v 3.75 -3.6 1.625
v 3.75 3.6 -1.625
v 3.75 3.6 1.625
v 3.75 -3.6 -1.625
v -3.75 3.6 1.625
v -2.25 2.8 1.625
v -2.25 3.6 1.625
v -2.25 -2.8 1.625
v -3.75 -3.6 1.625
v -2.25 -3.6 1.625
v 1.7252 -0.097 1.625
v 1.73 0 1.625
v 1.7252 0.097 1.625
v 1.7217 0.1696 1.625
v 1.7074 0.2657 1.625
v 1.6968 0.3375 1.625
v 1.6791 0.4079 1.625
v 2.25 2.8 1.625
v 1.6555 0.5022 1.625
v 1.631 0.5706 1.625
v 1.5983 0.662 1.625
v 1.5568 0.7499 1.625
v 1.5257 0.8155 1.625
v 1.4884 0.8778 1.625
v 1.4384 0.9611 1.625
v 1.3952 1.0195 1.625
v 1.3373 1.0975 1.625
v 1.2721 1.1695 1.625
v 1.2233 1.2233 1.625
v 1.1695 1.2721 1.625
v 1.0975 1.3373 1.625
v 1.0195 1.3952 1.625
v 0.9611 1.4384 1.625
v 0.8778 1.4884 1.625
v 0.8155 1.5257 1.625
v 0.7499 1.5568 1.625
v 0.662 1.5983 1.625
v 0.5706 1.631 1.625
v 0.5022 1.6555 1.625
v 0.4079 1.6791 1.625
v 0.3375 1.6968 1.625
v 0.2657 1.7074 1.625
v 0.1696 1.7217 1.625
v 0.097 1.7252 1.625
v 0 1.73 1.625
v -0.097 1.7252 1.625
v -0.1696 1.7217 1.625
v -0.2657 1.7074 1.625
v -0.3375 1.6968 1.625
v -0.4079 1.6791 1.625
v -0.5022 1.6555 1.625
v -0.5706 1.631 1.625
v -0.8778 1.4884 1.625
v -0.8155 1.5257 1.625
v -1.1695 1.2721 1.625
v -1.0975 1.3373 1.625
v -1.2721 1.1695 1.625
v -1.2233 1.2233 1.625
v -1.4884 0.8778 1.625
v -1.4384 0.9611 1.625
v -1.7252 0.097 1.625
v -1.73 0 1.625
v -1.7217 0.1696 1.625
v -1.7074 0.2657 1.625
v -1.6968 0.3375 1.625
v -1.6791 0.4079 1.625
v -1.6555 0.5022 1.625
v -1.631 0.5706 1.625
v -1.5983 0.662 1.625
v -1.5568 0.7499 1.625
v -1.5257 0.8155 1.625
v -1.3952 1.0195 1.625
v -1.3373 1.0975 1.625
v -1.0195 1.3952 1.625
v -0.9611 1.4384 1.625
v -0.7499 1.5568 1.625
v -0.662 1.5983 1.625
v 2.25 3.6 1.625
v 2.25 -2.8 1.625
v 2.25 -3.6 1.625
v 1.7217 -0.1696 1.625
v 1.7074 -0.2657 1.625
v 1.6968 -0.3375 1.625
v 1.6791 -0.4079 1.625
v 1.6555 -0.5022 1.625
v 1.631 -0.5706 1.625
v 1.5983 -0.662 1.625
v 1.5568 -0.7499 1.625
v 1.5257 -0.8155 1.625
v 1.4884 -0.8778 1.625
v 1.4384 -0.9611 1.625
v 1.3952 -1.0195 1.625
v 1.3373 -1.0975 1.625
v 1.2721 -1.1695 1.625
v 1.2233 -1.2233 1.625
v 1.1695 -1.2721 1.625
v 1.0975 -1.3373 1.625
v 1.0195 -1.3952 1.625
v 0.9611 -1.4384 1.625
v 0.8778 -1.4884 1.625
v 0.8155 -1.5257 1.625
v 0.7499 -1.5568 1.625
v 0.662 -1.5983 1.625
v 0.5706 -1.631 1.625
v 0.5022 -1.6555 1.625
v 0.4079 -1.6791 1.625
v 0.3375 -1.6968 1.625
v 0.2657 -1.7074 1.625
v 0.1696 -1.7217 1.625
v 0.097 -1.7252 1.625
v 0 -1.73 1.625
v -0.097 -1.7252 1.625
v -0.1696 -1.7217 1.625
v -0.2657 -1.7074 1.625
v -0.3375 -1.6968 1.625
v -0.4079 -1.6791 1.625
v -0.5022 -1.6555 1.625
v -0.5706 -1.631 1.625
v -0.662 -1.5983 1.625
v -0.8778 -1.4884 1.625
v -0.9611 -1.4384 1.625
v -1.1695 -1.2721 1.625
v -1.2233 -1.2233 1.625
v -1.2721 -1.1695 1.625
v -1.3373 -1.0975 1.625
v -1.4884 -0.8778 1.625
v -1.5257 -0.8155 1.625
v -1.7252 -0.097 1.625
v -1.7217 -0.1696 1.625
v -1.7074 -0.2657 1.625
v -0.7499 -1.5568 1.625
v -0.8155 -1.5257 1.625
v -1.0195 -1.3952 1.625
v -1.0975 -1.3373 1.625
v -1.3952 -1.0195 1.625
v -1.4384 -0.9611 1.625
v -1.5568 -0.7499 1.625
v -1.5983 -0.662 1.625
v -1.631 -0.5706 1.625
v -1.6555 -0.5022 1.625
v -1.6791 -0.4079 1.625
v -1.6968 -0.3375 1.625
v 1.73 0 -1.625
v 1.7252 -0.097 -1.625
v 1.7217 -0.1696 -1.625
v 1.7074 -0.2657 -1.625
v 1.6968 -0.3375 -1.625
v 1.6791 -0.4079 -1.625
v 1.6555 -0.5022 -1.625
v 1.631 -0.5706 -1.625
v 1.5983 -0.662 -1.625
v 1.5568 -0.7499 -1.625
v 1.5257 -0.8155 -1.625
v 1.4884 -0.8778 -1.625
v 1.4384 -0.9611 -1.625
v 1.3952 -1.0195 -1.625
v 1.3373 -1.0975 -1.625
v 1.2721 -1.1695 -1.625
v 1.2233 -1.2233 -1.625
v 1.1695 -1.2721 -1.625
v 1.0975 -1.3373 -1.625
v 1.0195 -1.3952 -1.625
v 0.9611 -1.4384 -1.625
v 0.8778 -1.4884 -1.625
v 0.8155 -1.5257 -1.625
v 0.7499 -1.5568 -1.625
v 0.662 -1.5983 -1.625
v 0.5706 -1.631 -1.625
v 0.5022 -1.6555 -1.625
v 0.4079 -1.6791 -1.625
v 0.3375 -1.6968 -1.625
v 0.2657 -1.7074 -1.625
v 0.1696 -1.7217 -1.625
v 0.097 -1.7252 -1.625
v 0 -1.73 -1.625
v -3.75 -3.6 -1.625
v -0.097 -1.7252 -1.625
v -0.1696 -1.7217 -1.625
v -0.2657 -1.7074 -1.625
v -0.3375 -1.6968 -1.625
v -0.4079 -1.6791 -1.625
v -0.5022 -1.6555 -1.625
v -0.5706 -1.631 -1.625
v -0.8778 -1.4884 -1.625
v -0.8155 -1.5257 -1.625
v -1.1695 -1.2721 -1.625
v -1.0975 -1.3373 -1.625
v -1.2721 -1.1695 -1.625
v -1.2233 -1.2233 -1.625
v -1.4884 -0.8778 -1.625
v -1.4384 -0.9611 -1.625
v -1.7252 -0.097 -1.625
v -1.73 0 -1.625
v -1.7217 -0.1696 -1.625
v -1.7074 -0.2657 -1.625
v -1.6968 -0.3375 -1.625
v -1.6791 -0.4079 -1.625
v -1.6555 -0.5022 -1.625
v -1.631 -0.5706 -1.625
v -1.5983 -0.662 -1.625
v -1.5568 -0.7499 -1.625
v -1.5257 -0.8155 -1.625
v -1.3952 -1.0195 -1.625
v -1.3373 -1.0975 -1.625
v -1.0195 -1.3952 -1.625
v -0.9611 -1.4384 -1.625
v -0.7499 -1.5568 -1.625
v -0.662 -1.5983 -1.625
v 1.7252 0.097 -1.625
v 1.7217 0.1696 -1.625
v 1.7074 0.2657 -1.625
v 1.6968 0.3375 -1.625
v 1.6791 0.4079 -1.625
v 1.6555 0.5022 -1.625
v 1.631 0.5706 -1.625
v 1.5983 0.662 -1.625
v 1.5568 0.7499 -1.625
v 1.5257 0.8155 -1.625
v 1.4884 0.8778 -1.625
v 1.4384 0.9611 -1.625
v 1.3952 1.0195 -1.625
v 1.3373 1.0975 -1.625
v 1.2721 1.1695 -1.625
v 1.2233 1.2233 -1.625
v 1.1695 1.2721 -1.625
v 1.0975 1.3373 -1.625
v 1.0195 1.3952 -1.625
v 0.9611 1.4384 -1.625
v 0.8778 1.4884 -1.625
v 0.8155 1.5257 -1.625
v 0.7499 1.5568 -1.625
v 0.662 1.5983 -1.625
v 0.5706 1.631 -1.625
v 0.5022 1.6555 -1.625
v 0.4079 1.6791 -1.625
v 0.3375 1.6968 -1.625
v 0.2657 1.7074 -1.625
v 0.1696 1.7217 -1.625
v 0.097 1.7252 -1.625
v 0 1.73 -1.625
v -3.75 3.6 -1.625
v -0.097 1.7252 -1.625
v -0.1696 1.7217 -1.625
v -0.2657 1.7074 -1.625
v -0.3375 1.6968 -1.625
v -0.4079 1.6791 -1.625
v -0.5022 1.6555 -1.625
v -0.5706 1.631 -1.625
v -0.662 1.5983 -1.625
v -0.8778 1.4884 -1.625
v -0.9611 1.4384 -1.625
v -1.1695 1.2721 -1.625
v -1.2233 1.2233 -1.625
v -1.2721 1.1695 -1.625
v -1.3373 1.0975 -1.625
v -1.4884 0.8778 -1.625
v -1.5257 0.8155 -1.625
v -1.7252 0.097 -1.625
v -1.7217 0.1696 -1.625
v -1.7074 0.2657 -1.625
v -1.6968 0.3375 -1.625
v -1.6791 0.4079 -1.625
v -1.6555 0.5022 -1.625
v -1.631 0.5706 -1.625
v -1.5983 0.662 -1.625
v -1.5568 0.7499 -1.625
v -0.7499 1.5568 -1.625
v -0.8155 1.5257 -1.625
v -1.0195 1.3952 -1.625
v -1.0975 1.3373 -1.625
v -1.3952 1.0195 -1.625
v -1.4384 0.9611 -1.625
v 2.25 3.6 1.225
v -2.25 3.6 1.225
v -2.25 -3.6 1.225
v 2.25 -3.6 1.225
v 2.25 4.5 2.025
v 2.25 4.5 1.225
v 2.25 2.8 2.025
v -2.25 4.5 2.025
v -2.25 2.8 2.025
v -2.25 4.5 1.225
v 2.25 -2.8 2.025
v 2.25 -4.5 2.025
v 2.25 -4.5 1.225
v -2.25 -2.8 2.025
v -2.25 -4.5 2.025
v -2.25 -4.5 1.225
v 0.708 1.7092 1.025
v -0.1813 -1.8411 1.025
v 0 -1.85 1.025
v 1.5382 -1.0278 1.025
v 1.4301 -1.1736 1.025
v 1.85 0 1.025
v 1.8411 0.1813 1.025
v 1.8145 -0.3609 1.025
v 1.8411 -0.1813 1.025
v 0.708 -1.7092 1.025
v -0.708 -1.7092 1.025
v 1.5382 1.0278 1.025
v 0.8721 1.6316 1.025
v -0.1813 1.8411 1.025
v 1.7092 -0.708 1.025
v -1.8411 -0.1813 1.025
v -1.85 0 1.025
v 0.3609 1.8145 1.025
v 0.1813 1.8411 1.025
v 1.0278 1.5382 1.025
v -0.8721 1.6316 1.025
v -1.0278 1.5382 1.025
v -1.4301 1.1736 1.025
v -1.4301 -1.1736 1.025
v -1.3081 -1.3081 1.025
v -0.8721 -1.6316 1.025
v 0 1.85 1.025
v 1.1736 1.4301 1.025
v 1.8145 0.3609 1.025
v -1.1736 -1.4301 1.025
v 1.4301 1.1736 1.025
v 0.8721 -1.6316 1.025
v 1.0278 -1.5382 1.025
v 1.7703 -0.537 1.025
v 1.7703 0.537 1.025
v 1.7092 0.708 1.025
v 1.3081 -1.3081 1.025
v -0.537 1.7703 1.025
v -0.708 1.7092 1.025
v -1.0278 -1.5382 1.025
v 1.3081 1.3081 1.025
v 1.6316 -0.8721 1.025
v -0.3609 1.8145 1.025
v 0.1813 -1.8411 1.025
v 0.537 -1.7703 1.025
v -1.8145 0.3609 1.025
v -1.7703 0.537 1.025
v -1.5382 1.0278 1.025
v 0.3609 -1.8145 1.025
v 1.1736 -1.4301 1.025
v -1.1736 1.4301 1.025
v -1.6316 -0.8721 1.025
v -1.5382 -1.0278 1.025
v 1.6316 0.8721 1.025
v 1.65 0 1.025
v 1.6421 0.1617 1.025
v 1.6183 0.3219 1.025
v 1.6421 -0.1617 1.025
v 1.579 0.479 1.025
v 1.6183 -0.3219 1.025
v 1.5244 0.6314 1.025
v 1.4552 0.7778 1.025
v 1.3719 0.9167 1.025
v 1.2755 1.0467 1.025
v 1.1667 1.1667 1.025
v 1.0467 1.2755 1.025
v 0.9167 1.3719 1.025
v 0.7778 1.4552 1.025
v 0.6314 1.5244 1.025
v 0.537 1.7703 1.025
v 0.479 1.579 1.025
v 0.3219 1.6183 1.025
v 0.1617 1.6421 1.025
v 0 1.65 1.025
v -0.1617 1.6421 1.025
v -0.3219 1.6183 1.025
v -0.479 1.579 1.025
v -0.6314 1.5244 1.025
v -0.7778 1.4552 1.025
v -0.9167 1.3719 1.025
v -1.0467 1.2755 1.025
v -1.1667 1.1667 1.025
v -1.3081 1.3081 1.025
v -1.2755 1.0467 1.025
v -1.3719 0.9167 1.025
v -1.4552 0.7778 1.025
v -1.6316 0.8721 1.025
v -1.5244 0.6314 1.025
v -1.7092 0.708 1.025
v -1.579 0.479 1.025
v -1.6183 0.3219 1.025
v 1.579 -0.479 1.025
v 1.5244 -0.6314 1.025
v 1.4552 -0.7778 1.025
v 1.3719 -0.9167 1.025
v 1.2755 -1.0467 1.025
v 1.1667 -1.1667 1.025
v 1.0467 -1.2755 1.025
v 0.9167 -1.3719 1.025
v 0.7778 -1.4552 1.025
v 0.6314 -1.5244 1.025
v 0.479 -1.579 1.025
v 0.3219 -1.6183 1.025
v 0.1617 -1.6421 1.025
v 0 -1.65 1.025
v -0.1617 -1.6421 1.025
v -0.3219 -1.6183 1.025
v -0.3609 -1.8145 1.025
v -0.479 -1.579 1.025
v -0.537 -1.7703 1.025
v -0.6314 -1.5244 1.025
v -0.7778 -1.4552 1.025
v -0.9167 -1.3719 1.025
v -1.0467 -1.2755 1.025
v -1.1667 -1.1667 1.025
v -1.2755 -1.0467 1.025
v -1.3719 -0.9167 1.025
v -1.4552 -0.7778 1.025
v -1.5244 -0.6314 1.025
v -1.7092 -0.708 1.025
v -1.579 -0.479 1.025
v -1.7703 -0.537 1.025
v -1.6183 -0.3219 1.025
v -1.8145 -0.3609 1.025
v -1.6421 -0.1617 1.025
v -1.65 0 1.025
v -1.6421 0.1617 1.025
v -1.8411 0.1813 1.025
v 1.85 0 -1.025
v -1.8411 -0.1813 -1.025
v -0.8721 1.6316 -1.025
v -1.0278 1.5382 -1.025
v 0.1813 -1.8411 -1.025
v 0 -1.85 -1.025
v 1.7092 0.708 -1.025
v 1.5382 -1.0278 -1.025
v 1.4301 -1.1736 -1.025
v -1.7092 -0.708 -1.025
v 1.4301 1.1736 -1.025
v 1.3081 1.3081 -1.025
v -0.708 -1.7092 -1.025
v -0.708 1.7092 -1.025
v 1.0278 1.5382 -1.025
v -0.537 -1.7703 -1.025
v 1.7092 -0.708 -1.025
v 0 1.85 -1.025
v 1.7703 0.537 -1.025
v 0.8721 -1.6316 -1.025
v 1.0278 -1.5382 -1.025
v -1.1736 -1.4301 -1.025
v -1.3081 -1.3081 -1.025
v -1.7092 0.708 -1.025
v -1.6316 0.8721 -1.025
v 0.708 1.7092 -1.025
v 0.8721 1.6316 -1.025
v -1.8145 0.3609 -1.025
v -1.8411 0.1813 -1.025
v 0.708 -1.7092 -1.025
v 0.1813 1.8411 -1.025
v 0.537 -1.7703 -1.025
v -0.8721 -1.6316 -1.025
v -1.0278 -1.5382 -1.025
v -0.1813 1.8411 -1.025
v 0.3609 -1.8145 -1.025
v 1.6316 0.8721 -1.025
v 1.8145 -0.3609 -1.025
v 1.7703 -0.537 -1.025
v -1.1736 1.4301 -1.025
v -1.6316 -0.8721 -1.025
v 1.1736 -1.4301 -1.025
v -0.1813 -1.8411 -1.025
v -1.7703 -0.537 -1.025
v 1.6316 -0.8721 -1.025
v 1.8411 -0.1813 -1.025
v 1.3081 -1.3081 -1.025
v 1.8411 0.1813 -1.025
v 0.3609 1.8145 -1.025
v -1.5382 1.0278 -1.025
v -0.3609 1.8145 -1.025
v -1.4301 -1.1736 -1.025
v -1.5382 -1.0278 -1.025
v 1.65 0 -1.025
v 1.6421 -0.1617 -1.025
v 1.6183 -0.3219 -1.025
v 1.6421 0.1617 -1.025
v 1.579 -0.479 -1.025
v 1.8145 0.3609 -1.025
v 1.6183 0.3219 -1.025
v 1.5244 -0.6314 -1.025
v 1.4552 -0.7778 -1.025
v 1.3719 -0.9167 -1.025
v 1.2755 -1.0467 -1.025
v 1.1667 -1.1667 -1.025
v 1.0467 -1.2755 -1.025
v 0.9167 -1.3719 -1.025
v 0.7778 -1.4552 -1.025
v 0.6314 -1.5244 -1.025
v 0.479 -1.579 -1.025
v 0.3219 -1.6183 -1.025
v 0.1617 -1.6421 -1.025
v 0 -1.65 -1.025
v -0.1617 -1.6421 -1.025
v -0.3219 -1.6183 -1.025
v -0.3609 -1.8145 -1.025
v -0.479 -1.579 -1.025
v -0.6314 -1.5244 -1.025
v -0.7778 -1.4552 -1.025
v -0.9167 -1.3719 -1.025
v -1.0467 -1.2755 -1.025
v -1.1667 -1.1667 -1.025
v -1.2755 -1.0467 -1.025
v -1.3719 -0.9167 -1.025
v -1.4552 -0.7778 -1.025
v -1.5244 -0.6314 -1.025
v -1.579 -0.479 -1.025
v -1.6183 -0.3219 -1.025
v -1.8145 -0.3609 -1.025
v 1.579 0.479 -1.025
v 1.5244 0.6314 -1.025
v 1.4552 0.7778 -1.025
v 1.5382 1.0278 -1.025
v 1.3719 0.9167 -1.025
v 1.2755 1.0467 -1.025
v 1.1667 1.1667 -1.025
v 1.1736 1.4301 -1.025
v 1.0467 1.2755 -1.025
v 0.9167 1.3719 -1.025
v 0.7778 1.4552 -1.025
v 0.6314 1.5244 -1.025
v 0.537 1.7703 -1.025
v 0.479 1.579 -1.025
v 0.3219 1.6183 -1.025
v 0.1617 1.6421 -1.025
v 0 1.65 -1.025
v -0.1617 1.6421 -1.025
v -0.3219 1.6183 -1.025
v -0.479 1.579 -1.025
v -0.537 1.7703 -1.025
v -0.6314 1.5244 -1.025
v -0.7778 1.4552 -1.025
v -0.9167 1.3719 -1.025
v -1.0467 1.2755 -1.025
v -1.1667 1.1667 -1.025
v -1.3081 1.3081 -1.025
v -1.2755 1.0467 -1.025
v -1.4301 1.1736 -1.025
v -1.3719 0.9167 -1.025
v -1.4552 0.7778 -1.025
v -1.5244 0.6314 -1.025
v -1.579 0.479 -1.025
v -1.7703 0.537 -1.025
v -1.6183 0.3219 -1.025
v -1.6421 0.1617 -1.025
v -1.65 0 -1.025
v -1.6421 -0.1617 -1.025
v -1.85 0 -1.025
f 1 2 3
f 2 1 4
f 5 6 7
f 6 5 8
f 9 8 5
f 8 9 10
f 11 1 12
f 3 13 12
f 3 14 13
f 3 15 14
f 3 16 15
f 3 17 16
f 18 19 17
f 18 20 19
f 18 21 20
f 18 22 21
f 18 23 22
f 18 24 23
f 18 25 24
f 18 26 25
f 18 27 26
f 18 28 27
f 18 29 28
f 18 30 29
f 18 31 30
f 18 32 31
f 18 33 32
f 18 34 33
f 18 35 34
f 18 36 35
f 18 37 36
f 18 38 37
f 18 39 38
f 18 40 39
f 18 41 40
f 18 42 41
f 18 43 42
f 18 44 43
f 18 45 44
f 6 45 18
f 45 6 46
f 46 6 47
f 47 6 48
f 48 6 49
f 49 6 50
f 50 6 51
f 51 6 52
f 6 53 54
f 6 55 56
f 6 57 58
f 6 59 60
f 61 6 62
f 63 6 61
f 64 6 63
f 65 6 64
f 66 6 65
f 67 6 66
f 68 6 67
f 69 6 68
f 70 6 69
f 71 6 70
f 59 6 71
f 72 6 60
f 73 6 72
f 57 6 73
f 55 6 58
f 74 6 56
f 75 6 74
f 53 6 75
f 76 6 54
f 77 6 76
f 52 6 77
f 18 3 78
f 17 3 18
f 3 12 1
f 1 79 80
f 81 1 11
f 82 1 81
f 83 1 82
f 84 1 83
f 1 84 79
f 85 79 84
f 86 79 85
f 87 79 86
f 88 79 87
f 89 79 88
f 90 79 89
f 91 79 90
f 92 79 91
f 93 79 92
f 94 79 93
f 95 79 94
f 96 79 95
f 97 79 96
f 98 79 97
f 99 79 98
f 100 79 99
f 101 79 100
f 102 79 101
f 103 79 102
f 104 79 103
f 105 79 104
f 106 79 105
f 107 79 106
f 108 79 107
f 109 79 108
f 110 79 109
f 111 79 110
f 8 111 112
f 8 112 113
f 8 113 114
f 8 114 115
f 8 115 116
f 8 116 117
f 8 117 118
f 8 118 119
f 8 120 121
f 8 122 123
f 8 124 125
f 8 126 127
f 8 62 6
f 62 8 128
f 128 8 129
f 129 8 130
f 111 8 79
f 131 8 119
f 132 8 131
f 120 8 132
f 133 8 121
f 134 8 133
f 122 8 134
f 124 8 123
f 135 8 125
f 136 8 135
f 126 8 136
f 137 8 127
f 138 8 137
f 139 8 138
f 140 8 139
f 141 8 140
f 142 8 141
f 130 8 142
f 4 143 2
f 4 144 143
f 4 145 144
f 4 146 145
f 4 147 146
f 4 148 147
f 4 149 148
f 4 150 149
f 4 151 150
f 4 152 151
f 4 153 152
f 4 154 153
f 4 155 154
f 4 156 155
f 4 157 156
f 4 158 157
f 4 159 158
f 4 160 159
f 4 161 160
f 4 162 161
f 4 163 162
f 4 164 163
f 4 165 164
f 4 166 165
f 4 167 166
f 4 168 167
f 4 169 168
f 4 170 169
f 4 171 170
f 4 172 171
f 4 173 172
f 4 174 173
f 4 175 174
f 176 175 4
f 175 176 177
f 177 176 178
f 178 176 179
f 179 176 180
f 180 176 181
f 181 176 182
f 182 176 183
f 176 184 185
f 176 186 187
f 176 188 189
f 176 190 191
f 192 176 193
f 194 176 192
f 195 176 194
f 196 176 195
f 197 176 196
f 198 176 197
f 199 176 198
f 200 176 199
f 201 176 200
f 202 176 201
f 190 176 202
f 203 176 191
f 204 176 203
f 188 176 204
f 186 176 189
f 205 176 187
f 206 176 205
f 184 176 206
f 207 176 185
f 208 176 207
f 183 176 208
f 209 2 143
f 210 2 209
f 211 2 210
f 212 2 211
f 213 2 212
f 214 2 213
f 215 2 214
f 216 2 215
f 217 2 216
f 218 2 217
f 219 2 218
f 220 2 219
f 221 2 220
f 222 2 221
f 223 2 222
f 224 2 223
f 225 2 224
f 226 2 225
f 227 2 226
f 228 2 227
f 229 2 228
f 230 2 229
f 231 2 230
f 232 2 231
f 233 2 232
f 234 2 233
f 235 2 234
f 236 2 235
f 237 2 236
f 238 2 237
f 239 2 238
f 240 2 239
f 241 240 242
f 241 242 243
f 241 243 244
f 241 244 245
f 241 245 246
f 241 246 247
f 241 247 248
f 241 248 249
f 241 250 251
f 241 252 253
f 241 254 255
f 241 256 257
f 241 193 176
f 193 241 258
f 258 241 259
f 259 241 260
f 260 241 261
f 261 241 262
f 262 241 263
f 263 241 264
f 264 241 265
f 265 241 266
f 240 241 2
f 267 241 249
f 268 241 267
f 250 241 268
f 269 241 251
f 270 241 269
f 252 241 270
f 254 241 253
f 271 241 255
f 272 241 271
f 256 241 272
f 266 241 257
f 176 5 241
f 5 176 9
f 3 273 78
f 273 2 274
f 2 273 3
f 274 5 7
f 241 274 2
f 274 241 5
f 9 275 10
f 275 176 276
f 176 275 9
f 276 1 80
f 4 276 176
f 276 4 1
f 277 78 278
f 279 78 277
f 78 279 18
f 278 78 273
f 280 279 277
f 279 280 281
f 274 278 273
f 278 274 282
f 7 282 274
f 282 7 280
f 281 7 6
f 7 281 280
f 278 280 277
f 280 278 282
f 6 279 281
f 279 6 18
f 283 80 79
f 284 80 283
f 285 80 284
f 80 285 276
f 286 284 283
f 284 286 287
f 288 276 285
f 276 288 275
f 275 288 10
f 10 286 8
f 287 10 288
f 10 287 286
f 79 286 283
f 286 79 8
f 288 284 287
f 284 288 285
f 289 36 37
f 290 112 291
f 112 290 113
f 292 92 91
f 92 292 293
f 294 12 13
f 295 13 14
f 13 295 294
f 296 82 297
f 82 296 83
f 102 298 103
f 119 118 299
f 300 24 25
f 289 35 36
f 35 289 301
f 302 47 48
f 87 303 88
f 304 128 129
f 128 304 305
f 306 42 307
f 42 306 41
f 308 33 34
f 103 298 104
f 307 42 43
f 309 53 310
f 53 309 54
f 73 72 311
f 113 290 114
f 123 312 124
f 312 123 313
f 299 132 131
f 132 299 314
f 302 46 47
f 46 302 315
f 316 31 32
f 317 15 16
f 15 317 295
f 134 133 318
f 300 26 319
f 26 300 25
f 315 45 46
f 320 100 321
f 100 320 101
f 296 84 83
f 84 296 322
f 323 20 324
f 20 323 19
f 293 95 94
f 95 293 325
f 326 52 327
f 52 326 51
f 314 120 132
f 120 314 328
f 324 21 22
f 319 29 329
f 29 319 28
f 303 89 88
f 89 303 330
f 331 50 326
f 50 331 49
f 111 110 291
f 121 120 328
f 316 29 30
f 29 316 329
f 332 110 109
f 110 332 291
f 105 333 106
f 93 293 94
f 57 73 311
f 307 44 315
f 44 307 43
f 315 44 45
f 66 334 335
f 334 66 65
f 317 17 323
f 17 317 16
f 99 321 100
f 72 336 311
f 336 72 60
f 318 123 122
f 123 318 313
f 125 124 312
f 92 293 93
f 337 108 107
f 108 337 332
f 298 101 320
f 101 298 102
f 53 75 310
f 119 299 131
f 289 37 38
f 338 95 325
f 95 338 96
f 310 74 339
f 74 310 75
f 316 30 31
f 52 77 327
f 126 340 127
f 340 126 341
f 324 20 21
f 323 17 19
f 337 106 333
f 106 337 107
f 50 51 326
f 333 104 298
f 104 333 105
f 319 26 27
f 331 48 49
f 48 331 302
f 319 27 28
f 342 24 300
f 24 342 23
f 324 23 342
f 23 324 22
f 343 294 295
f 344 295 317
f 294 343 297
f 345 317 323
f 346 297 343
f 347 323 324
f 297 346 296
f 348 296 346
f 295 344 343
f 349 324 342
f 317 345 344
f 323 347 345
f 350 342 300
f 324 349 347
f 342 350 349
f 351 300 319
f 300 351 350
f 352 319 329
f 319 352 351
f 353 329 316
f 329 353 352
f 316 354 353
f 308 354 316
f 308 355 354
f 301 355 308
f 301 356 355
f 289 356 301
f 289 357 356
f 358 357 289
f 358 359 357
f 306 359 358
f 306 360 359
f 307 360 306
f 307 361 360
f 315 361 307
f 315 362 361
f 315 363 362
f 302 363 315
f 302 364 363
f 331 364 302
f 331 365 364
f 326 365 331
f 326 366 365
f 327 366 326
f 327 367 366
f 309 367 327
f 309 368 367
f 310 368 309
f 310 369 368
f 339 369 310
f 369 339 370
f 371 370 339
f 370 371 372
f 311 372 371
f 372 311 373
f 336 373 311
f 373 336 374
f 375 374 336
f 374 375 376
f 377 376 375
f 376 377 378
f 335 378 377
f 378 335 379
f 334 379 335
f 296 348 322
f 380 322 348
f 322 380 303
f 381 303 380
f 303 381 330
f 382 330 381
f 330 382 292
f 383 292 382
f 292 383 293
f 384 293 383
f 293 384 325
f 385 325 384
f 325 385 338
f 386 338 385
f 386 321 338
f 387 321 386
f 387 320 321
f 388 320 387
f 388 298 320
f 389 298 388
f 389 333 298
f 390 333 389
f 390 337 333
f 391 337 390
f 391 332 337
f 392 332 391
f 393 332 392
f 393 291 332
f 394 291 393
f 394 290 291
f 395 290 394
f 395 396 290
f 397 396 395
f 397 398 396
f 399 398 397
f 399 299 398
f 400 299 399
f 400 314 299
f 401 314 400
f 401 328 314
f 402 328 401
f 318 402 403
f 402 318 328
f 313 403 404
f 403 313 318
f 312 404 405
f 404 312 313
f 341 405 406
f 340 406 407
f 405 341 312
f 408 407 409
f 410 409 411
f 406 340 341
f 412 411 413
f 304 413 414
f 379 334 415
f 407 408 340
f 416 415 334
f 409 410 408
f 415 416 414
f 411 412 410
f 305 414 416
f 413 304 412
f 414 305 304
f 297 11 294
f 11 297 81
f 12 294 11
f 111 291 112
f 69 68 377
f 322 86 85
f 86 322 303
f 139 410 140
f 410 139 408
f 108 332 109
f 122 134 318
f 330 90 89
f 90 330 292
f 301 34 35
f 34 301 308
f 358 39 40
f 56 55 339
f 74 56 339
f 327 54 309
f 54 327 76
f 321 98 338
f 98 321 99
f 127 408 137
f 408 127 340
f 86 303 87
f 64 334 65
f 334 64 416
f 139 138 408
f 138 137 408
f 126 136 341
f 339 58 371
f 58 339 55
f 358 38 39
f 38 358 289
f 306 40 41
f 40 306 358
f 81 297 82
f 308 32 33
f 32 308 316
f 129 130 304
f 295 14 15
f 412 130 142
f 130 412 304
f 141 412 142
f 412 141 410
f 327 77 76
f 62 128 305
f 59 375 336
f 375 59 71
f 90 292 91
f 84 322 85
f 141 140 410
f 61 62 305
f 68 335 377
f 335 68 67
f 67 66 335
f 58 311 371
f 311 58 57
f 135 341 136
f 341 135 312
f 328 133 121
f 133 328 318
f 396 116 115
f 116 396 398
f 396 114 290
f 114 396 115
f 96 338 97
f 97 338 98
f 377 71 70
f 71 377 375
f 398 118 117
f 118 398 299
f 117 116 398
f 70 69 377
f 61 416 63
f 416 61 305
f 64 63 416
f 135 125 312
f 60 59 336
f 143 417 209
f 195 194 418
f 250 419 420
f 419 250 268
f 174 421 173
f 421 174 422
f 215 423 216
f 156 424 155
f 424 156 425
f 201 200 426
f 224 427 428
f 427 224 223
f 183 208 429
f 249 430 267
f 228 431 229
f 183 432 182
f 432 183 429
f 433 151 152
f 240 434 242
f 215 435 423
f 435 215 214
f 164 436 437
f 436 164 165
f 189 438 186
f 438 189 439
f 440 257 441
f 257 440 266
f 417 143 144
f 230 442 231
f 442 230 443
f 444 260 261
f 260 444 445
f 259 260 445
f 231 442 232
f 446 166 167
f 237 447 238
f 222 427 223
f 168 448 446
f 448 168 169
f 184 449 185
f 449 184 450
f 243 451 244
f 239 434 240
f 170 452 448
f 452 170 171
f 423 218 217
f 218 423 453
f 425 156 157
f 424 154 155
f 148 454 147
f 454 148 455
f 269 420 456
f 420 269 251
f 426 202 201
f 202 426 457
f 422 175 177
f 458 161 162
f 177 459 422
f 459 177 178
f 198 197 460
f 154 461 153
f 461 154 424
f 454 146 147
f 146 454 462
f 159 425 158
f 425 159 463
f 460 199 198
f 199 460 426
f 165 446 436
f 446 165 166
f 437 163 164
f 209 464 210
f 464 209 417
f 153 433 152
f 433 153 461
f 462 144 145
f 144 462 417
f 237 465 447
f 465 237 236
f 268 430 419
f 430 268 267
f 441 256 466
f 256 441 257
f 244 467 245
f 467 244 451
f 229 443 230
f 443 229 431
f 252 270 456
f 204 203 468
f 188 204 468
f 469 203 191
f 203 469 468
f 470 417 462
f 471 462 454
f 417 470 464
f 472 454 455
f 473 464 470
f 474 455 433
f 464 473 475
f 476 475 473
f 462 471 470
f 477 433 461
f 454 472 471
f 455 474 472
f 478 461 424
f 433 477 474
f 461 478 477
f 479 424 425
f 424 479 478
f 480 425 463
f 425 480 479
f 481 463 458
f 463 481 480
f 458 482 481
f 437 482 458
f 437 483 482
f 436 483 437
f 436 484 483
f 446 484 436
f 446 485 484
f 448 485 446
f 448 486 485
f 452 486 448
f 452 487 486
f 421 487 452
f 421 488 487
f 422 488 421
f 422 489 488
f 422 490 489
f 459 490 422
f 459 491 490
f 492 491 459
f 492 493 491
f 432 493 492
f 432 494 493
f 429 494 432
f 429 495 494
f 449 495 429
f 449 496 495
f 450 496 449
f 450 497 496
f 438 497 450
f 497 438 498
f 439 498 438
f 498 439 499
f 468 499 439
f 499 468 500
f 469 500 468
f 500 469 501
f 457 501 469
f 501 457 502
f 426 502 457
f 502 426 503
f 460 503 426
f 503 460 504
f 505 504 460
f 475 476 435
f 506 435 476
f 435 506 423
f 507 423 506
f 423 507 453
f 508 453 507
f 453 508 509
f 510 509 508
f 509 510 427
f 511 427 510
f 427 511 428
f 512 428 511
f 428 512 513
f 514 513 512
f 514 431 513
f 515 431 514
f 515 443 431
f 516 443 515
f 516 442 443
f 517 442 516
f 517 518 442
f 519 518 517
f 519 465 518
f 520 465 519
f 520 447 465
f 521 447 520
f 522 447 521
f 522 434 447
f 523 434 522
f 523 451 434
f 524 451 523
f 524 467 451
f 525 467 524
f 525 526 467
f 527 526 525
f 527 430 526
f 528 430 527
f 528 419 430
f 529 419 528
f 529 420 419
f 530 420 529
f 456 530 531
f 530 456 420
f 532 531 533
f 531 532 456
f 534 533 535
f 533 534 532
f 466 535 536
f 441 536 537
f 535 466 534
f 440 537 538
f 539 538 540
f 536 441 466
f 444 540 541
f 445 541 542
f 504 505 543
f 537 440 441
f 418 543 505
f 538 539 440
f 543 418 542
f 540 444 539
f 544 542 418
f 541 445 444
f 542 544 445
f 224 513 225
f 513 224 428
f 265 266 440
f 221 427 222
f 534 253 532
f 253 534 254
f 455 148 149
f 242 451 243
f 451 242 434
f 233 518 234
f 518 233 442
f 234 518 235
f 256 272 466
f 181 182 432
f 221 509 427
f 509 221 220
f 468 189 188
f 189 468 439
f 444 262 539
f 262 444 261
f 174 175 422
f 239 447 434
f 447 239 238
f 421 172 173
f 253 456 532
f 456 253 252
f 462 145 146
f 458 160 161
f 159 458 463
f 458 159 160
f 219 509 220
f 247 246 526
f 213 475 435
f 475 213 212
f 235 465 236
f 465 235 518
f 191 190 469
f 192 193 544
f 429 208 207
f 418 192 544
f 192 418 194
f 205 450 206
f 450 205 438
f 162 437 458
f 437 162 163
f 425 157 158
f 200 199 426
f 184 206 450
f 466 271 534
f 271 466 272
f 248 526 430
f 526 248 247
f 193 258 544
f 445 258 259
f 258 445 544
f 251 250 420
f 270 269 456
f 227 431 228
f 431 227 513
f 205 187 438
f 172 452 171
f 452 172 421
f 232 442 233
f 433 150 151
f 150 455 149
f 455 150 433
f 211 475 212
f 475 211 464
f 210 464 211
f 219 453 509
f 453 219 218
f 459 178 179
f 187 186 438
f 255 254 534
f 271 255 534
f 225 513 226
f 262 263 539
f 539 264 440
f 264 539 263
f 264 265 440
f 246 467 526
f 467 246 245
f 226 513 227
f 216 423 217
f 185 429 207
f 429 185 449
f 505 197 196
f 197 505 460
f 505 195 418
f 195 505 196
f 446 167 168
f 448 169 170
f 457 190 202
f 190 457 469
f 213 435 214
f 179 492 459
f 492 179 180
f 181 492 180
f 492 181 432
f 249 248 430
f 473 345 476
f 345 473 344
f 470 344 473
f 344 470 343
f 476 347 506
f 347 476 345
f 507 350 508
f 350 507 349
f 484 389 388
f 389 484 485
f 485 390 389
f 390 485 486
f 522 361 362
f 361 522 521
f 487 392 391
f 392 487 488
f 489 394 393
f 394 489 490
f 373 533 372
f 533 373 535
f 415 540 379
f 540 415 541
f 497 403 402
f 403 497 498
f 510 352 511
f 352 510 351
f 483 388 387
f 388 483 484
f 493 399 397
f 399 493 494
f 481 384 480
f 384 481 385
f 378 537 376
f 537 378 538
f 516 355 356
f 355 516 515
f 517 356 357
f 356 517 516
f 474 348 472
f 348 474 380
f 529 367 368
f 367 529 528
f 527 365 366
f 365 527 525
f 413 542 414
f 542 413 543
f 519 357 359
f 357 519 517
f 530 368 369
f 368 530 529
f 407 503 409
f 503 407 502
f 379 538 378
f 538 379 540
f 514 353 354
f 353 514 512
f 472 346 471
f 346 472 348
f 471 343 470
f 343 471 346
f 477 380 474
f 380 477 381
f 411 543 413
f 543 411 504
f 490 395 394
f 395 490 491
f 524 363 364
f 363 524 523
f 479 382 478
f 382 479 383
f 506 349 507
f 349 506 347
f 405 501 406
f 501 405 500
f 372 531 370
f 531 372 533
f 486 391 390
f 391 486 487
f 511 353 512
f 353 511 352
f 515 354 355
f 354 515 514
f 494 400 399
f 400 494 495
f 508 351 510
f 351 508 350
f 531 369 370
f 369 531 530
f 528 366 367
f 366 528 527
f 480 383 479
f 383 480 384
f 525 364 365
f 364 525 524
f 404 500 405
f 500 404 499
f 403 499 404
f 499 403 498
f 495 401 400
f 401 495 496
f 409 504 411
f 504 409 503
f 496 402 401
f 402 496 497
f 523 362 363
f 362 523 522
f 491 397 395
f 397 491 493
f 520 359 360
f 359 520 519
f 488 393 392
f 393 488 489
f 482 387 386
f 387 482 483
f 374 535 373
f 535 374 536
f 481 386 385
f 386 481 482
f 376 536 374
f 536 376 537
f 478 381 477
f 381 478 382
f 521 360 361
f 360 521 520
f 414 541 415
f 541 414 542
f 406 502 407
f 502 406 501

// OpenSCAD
// Parameters
screw_nominal_diameter_mm = 4.0; //[2.0:8.0:0.1]
nut_across_flats_mm = 6.0; //[3.0:12.0:0.1]
nut_thickness_mm = 3.25; //[1.6:6.5:0.05]
hole_type_threaded = 1; //[0:1:1]
thread_pitch_mm = 0.7; //[0.35:1.4:0.05]  // (not modeled; drill/tap only)
clearance_hole_diameter_mm_if_unthreaded = 4.3; //[4.0:5.0:0.05]
tap_drill_diameter_mm_for_threaded = 3.3; //[2.5:4.0:0.05]
edge_chamfer_mm = 0.2; //[0.0:0.8:0.05]
fit_clearance_mm = 0.2; //[0.0:0.6:0.05]
t_slot_width_mm = 8.0; //[4.0:16.0:0.1]
t_slot_lip_thickness_mm = 1.5; //[0.8:3.0:0.1]
t_slot_depth_mm = 6.0; //[3.0:12.0:0.1]
shoulder_height_mm = 0.8; //[0.4:1.6:0.05]
shoulder_overhang_mm = 0.8; //[0.3:2.0:0.05]
shoulder_length_mm = 4.5; //[2.0:10.0:0.1]
overlap_mm = 0.8; //[0.5:2.0:0.1]

// Quality
$fn = 64;

// Helpers
function hex_R_from_AF(af) = af/(2*cos(30)); // circumradius for a hex with across-flats = af

module hex_prism(af, h, center=true) {
    cylinder(r=hex_R_from_AF(af), h=h, center=center, $fn=6);
}

module chamfered_hex(af, h, chamfer) {
    // Chamfered by subtracting two 45° cones from top/bottom edges
    difference() {
        hex_prism(af, h, center=true);

        if (chamfer > 0) {
            // Top chamfer
            translate([0,0, h/2 - chamfer/2])
                cylinder(h=chamfer + overlap_mm,
                         r1=hex_R_from_AF(af) + chamfer,
                         r2=hex_R_from_AF(af) - 0.01,
                         center=true, $fn=6);

            // Bottom chamfer
            translate([0,0,-h/2 + chamfer/2])
                cylinder(h=chamfer + overlap_mm,
                         r1=hex_R_from_AF(af) - 0.01,
                         r2=hex_R_from_AF(af) + chamfer,
                         center=true, $fn=6);
        }
    }
}

// M4 T-slot / hammer nut (single connected solid with a through-hole)
module M4_hammer_nut() {
    // Body dimensions (typical hammer nut: rectangular bar with two retention shoulders)
    body_len_mm = max(shoulder_length_mm + 2.0, t_slot_width_mm - 0.5); // along X
    body_w_mm   = max(nut_across_flats_mm + 1.0, t_slot_width_mm - 0.8); // along Y
    body_h_mm   = nut_thickness_mm;

    // Shoulders: small ledges near the top that catch under the T-slot lips
    shoulder_w_mm = max(0.6, t_slot_lip_thickness_mm + fit_clearance_mm); // along Y (each side)
    shoulder_len_mm = min(body_len_mm, shoulder_length_mm);
    shoulder_h_mm = min(shoulder_height_mm, body_h_mm * 0.6);

    // Place shoulders at the top face, protruding outward in +/-Y
    shoulder_z = body_h_mm/2 - shoulder_h_mm/2 + overlap_mm/2;
    shoulder_y = body_w_mm/2 + shoulder_w_mm/2 - overlap_mm; // overlap into body for connectivity

    // Hole diameter (modeled as drill/tap hole or clearance hole)
    hole_d = (hole_type_threaded == 1) ? tap_drill_diameter_mm_for_threaded
                                       : clearance_hole_diameter_mm_if_unthreaded;

    difference() {
        union() {
            // Main rectangular hammer-nut body
            translate([0,0,0])
                cube([body_len_mm, body_w_mm, body_h_mm], center=true);

            // Retention shoulders (connected via calculated overlap)
            translate([0,  shoulder_y, shoulder_z])
                cube([shoulder_len_mm, shoulder_w_mm, shoulder_h_mm], center=true);

            translate([0, -shoulder_y, shoulder_z])
                cube([shoulder_len_mm, shoulder_w_mm, shoulder_h_mm], center=true);

            // Optional small top chamfered hex boss to show 6mm across-flats feature
            // (kept low so overall thickness remains nut_thickness_mm)
            boss_h = min(1.2, body_h_mm - 0.4);
            boss_z = body_h_mm/2 - boss_h/2 - 0.0; // sits on top face
            translate([0,0,boss_z])
                chamfered_hex(nut_across_flats_mm, boss_h, min(edge_chamfer_mm, boss_h/2 - 0.01));
        }

        // Through-hole for M4 screw (tap drill or clearance)
        cylinder(d=hole_d, h=body_h_mm + 2*overlap_mm, center=true);

        // Light edge chamfer on the hole (both sides) for printability
        if (edge_chamfer_mm > 0) {
            translate([0,0, body_h_mm/2 - edge_chamfer_mm/2])
                cylinder(h=edge_chamfer_mm + overlap_mm,
                         d1=hole_d + 2*edge_chamfer_mm,
                         d2=hole_d,
                         center=true);

            translate([0,0,-body_h_mm/2 + edge_chamfer_mm/2])
                cylinder(h=edge_chamfer_mm + overlap_mm,
                         d1=hole_d,
                         d2=hole_d + 2*edge_chamfer_mm,
                         center=true);
        }
    }
}

M4_hammer_nut();
